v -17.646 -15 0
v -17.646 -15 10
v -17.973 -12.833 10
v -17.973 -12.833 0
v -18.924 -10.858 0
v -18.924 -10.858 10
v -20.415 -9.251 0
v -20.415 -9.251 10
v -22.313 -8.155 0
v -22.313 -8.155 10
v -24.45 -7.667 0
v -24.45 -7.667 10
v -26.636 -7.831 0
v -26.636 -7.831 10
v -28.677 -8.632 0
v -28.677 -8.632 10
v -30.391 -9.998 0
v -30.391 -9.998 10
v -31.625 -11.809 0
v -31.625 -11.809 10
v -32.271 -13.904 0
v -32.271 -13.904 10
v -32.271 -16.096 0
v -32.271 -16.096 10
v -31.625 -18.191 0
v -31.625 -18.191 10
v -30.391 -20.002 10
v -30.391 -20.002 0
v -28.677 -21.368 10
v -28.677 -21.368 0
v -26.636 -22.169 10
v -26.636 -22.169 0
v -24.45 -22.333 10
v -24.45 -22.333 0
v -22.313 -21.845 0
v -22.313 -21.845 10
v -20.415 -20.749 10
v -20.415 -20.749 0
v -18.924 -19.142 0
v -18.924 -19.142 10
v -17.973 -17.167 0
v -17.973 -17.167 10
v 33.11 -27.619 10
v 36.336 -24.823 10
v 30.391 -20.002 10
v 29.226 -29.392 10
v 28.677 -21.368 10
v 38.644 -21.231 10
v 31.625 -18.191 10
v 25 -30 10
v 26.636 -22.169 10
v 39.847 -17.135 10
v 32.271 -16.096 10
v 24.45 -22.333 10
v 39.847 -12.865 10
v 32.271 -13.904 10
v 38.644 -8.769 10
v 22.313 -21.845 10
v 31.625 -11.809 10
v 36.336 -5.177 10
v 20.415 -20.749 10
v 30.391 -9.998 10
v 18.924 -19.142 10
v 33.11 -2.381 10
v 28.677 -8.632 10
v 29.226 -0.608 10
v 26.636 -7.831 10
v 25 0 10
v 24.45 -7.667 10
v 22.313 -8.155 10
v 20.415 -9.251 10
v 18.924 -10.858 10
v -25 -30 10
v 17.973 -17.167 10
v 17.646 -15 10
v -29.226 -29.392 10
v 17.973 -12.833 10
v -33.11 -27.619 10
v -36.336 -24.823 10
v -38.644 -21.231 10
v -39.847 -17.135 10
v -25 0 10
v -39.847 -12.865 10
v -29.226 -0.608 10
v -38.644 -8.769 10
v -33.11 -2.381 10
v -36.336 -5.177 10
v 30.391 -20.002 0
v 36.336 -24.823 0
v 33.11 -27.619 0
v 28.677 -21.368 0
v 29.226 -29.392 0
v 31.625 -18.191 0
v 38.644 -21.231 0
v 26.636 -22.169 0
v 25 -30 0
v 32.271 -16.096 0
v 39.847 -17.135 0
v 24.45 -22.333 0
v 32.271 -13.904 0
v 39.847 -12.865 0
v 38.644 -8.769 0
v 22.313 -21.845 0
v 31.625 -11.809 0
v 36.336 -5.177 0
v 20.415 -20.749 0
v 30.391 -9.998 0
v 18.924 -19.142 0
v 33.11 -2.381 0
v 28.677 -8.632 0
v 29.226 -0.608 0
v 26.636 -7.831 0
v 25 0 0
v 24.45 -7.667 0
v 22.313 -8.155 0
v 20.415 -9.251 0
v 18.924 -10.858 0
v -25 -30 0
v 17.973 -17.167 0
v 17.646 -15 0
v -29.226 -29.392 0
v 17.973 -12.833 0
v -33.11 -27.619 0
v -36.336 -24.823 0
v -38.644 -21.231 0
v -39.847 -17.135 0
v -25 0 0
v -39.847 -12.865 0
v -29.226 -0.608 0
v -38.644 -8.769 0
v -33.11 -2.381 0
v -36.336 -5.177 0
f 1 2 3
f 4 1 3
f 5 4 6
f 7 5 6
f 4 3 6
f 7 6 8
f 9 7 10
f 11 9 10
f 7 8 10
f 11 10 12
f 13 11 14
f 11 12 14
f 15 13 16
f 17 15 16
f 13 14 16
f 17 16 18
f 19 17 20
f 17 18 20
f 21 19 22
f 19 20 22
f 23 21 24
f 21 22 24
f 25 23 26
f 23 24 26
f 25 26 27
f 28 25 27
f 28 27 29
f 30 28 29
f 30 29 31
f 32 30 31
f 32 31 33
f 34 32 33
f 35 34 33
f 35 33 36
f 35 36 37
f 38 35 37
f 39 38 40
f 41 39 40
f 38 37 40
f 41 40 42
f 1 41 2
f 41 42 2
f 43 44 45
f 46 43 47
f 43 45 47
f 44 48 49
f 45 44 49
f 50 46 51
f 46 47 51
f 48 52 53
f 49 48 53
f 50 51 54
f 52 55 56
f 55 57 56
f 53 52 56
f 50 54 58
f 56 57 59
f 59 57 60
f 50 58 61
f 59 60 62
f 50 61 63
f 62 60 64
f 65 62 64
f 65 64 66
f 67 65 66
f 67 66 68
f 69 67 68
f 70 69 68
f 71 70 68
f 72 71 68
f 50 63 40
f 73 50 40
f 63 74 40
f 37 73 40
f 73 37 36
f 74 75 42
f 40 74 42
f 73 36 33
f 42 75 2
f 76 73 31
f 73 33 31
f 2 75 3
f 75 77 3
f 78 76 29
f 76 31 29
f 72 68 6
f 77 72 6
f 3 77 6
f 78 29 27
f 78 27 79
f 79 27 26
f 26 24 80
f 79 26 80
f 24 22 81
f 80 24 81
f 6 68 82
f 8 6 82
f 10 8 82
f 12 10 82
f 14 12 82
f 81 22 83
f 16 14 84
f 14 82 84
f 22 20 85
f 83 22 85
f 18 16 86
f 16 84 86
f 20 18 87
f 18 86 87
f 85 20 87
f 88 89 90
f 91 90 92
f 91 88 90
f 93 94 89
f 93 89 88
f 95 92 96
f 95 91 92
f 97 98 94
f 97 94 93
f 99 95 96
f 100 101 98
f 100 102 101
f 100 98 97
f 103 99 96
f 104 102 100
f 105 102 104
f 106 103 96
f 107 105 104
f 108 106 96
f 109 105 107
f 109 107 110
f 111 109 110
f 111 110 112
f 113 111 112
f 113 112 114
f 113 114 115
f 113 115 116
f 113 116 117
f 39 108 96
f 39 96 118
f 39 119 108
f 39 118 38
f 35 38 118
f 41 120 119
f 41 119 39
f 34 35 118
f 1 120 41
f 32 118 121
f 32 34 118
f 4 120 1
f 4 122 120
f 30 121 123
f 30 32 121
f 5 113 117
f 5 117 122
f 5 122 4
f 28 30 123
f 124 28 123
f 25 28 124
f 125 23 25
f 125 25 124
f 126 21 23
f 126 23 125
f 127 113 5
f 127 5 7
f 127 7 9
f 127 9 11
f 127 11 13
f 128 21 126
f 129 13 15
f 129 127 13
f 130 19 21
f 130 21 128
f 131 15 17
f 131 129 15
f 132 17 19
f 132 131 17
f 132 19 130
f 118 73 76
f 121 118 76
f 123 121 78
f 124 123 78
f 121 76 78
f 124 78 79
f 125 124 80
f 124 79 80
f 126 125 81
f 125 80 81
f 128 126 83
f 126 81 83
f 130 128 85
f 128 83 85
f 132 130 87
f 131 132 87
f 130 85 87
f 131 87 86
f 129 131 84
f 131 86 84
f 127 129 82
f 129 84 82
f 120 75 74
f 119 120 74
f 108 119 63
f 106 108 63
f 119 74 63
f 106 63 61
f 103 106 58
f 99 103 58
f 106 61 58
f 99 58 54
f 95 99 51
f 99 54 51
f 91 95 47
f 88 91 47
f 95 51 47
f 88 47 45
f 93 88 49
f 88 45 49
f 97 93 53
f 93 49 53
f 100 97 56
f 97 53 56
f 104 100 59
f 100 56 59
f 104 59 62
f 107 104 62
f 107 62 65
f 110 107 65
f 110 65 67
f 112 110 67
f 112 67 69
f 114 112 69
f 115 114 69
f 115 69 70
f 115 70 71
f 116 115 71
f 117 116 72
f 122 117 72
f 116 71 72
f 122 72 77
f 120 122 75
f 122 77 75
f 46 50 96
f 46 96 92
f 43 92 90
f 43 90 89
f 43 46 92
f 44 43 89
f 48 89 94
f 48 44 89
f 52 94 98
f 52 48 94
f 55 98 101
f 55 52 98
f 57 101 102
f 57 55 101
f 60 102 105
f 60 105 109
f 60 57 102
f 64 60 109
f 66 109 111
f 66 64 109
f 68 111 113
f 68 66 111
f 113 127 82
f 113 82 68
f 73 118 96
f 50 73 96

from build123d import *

# Parameters (mm, degrees)
SKETCH1_W           = 50
SKETCH1_H           = 30
BOSS_EXTRUDE2_DEPTH = 10
BOSS_EXTRUDE3_DEPTH = 10
BOSS_EXTRUDE4_DEPTH = 10
SKETCH6_R           = 7.353544845
CUT_EXTRUDE1_DEPTH  = 10


with BuildPart() as part:
    # Sketch1 → Boss-Extrude2 (new body)
    with BuildSketch(Plane.XY):
        with Locations((0, -15)):
            Rectangle(SKETCH1_W, SKETCH1_H)
    extrude(amount=BOSS_EXTRUDE2_DEPTH)

    # Sketch4 → Boss-Extrude3 (add)
    with BuildSketch(Plane.XY.offset(10)):
        with BuildLine():
            Line((25, 0), (25, -30))
            ThreePointArc((25, -30), (40, -15), (25, 0))
        make_face()
    extrude(amount=-BOSS_EXTRUDE3_DEPTH)

    # Sketch5 → Boss-Extrude4 (add)
    with BuildSketch(Plane.XY.offset(10)):
        with BuildLine():
            Line((-25, 0), (-25, -30))
            ThreePointArc((-25, -30), (-40, -15), (-25, 0))
        make_face()
    extrude(amount=-BOSS_EXTRUDE4_DEPTH)

    # Sketch6 → Cut-Extrude1 (cut)
    with BuildSketch(Plane.XY.offset(10)):
        with Locations((-25, -15)):
            Circle(SKETCH6_R)
        with Locations(Location((25, -15, 0), (0, 0, 180))):
            Circle(SKETCH6_R)
    extrude(amount=-CUT_EXTRUDE1_DEPTH, mode=Mode.SUBTRACT)


solid = part.part
